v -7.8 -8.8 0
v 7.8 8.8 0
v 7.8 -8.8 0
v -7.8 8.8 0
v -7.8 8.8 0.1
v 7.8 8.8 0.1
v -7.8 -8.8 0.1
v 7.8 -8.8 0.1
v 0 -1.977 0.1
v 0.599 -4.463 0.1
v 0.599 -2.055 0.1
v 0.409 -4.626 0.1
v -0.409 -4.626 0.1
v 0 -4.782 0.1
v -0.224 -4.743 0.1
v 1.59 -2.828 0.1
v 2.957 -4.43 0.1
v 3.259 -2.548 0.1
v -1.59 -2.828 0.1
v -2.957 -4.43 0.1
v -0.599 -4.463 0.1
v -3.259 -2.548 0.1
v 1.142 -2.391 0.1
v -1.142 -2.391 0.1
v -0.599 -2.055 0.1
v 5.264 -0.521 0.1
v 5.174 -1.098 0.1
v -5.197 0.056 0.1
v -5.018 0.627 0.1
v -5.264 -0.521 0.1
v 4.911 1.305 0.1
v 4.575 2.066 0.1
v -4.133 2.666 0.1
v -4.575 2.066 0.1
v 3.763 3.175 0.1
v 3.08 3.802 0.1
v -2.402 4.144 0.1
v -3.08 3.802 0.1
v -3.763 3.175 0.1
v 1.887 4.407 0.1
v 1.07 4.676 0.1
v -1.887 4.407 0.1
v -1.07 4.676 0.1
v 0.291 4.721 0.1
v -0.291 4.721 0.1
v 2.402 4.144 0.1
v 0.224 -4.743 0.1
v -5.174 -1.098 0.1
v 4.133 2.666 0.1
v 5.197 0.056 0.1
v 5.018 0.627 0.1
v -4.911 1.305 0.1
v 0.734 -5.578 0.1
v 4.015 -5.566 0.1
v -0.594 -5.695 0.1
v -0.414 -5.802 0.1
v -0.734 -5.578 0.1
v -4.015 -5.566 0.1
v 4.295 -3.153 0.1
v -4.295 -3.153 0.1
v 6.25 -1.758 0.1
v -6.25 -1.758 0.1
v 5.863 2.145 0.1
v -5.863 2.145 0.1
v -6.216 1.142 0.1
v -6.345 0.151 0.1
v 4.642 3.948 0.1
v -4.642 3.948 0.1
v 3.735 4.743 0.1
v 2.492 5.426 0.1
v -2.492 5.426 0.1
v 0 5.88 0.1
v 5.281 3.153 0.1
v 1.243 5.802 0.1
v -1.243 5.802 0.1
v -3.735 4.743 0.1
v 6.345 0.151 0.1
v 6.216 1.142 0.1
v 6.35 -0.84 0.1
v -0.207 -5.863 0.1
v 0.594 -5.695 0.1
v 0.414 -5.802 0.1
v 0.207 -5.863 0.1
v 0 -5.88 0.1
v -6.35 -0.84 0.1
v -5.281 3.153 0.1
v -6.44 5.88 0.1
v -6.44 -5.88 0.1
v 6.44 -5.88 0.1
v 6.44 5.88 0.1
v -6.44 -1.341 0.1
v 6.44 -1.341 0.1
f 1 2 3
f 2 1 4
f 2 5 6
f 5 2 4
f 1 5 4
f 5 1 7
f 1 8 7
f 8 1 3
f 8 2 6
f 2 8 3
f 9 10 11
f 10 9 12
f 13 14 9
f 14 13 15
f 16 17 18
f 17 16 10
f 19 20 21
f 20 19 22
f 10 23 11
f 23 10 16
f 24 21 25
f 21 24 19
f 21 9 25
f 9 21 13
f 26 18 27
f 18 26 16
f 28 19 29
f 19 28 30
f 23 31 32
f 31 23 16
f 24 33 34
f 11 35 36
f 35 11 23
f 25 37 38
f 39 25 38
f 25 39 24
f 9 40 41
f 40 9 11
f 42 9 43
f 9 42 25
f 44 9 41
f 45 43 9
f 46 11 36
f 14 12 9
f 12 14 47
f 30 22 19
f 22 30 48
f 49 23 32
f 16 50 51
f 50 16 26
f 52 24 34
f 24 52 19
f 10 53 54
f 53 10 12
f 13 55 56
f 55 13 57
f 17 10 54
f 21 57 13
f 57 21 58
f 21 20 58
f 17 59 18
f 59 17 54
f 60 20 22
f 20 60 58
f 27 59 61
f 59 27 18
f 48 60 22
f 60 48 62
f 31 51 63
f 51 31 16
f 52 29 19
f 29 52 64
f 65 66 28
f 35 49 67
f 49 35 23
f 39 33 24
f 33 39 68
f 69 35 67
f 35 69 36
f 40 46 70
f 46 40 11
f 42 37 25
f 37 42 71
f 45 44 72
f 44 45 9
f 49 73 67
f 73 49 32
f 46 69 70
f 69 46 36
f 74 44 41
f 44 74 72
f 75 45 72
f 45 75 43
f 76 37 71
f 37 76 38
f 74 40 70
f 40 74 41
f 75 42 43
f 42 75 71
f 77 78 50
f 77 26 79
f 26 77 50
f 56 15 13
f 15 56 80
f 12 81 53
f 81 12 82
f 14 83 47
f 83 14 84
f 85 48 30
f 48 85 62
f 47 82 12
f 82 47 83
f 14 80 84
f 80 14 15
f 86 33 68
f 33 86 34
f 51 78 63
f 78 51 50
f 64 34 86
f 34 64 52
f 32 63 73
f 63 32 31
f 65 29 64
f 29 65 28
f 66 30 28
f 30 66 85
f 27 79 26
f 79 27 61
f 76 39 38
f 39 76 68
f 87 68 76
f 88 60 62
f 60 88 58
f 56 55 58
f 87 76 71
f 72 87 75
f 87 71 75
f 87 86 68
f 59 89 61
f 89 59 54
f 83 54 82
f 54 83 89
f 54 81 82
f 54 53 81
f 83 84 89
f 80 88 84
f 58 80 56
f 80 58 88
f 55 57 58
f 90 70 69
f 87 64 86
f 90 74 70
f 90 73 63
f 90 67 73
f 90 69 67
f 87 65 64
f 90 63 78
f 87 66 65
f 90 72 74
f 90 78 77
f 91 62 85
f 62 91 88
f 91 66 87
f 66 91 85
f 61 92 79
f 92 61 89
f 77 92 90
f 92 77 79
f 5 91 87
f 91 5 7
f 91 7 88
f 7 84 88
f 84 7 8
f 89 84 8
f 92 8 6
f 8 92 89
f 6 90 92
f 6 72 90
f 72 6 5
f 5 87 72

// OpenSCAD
// file: ../p/box5-12.scad
use <../lib.scad>
function ldraw_lib__box5_12() = [
// 0 Box with 5 Faces without Any Edges
// 0 Name: box5-12.dat
// 0 Author: Chris Dee [cwdee]
// 0 !LDRAW_ORG Primitive UPDATE 2009-02
// 0 !LICENSE Licensed under CC BY 2.0 and CC BY 4.0 : see CAreadme.txt
// 
// 0 BFC CERTIFY CCW
  [0,"BFC","CERTIFY"],
  [0,"BFC","CCW"],
// 
// 0 !HISTORY 2009-09-03 [PTadmin] Official Update 2009-02
// 
// 
// 4 16 1 1 1 1 1 -1 -1 1 -1 -1 1 1
  [4,16,1,1,1,1,1,-1,-1,1,-1,-1,1,1],
// 4 16 -1 0 1 1 0 1 1 1 1 -1 1 1
  [4,16,-1,0,1,1,0,1,1,1,1,-1,1,1],
// 4 16 -1 0 -1 -1 0 1 -1 1 1 -1 1 -1
  [4,16,-1,0,-1,-1,0,1,-1,1,1,-1,1,-1],
// 4 16 1 0 -1 -1 0 -1 -1 1 -1 1 1 -1
  [4,16,1,0,-1,-1,0,-1,-1,1,-1,1,1,-1],
// 4 16 1 0 1 1 0 -1 1 1 -1 1 1 1
  [4,16,1,0,1,1,0,-1,1,1,-1,1,1,1],
// 0
];
module ldraw_lib__box5_12(step=0, col=false, unit=2/5, alt=false, line=0.2, solid=!$preview)
    makepoly(ldraw_lib__box5_12(), step=step, col=col, unit=unit, alt=alt, line=line, solid=solid);
ldraw_lib__box5_12(line=0.2);
// main file
use <../lib.scad>
use <../p/box5-12.scad>
use <s/3004s60.scad>
function ldraw_lib__003605c() = [
// 0 Sticker  2.2 x  1.9 with Shell Logo 1971
// 0 Name: 003605c.dat
// 0 Author: Willy Tschager [Holly-Wood]
// 0 !LDRAW_ORG Part UPDATE 2022-01
// 0 !LICENSE Licensed under CC BY 2.0 and CC BY 4.0 : see CAreadme.txt
// 
// 0 BFC CERTIFY CCW
  [0,"BFC","CERTIFY"],
  [0,"BFC","CCW"],
// 
// 0 !KEYWORDS company, drilling, offshore, oil, platform, rig, set 373, tanker
// 
// 0 !HISTORY 2022-01-14 [PTadmin] Official Update 2022-01
// 
// 
// 0 // Small box
// 1 16 0 -.25 0 19.5 0 0 0 .25 0 0 0 22 box5-12.dat
  [1,16,0,-.25,0,19.5,0,0,0,.25,0,0,0,22, ldraw_lib__box5_12()],
// 
// 0 // Pattern
// 1 15 0 -.25 0 1.4 0 0 0 0 1 0 -1.4 0 s\3004s60.dat
  [1,15,0,-.25,0,1.4,0,0,0,0,1,0,-1.4,0, ldraw_lib__s__3004s60()],
// 
// 4 15 -16.1 -.25 -3.3516 -16.1 -.25 14.7 -19.5 -.25 22 -19.5 -.25 -22
  [4,15,-16.1,-.25,-3.3516,-16.1,-.25,14.7,-19.5,-.25,22,-19.5,-.25,-22],
// 3 15 -16.1 -.25 -3.3516 -19.5 -.25 -22 -16.1 -.25 -14.7
  [3,15,-16.1,-.25,-3.3516,-19.5,-.25,-22,-16.1,-.25,-14.7],
// 4 15 0 -.25 -14.7 -16.1 -.25 -14.7 -19.5 -.25 -22 19.5 -.25 -22
  [4,15,0,-.25,-14.7,-16.1,-.25,-14.7,-19.5,-.25,-22,19.5,-.25,-22],
// 3 15 16.1 -.25 -14.7 0 -.25 -14.7 19.5 -.25 -22
  [3,15,16.1,-.25,-14.7,0,-.25,-14.7,19.5,-.25,-22],
// 4 15 16.1 -.25 -3.3516 16.1 -.25 -14.7 19.5 -.25 -22 19.5 -.25 22
  [4,15,16.1,-.25,-3.3516,16.1,-.25,-14.7,19.5,-.25,-22,19.5,-.25,22],
// 3 15 19.5 -.25 22 16.1 -.25 14.7 16.1 -.25 -3.3516
  [3,15,19.5,-.25,22,16.1,-.25,14.7,16.1,-.25,-3.3516],
// 4 15 0 -.25 14.7 16.1 -.25 14.7 19.5 -.25 22 -19.5 -.25 22
  [4,15,0,-.25,14.7,16.1,-.25,14.7,19.5,-.25,22,-19.5,-.25,22],
// 3 15 -19.5 -.25 22 -16.1 -.25 14.7 0 -.25 14.7
  [3,15,-19.5,-.25,22,-16.1,-.25,14.7,0,-.25,14.7],
];
module ldraw_lib__003605c(step=0, col=false, unit=2/5, alt=false, line=0.2, solid=!$preview)
    makepoly(ldraw_lib__003605c(), step=step, col=col, unit=unit, alt=alt, line=line, solid=solid);
ldraw_lib__003605c(line=0.2);
